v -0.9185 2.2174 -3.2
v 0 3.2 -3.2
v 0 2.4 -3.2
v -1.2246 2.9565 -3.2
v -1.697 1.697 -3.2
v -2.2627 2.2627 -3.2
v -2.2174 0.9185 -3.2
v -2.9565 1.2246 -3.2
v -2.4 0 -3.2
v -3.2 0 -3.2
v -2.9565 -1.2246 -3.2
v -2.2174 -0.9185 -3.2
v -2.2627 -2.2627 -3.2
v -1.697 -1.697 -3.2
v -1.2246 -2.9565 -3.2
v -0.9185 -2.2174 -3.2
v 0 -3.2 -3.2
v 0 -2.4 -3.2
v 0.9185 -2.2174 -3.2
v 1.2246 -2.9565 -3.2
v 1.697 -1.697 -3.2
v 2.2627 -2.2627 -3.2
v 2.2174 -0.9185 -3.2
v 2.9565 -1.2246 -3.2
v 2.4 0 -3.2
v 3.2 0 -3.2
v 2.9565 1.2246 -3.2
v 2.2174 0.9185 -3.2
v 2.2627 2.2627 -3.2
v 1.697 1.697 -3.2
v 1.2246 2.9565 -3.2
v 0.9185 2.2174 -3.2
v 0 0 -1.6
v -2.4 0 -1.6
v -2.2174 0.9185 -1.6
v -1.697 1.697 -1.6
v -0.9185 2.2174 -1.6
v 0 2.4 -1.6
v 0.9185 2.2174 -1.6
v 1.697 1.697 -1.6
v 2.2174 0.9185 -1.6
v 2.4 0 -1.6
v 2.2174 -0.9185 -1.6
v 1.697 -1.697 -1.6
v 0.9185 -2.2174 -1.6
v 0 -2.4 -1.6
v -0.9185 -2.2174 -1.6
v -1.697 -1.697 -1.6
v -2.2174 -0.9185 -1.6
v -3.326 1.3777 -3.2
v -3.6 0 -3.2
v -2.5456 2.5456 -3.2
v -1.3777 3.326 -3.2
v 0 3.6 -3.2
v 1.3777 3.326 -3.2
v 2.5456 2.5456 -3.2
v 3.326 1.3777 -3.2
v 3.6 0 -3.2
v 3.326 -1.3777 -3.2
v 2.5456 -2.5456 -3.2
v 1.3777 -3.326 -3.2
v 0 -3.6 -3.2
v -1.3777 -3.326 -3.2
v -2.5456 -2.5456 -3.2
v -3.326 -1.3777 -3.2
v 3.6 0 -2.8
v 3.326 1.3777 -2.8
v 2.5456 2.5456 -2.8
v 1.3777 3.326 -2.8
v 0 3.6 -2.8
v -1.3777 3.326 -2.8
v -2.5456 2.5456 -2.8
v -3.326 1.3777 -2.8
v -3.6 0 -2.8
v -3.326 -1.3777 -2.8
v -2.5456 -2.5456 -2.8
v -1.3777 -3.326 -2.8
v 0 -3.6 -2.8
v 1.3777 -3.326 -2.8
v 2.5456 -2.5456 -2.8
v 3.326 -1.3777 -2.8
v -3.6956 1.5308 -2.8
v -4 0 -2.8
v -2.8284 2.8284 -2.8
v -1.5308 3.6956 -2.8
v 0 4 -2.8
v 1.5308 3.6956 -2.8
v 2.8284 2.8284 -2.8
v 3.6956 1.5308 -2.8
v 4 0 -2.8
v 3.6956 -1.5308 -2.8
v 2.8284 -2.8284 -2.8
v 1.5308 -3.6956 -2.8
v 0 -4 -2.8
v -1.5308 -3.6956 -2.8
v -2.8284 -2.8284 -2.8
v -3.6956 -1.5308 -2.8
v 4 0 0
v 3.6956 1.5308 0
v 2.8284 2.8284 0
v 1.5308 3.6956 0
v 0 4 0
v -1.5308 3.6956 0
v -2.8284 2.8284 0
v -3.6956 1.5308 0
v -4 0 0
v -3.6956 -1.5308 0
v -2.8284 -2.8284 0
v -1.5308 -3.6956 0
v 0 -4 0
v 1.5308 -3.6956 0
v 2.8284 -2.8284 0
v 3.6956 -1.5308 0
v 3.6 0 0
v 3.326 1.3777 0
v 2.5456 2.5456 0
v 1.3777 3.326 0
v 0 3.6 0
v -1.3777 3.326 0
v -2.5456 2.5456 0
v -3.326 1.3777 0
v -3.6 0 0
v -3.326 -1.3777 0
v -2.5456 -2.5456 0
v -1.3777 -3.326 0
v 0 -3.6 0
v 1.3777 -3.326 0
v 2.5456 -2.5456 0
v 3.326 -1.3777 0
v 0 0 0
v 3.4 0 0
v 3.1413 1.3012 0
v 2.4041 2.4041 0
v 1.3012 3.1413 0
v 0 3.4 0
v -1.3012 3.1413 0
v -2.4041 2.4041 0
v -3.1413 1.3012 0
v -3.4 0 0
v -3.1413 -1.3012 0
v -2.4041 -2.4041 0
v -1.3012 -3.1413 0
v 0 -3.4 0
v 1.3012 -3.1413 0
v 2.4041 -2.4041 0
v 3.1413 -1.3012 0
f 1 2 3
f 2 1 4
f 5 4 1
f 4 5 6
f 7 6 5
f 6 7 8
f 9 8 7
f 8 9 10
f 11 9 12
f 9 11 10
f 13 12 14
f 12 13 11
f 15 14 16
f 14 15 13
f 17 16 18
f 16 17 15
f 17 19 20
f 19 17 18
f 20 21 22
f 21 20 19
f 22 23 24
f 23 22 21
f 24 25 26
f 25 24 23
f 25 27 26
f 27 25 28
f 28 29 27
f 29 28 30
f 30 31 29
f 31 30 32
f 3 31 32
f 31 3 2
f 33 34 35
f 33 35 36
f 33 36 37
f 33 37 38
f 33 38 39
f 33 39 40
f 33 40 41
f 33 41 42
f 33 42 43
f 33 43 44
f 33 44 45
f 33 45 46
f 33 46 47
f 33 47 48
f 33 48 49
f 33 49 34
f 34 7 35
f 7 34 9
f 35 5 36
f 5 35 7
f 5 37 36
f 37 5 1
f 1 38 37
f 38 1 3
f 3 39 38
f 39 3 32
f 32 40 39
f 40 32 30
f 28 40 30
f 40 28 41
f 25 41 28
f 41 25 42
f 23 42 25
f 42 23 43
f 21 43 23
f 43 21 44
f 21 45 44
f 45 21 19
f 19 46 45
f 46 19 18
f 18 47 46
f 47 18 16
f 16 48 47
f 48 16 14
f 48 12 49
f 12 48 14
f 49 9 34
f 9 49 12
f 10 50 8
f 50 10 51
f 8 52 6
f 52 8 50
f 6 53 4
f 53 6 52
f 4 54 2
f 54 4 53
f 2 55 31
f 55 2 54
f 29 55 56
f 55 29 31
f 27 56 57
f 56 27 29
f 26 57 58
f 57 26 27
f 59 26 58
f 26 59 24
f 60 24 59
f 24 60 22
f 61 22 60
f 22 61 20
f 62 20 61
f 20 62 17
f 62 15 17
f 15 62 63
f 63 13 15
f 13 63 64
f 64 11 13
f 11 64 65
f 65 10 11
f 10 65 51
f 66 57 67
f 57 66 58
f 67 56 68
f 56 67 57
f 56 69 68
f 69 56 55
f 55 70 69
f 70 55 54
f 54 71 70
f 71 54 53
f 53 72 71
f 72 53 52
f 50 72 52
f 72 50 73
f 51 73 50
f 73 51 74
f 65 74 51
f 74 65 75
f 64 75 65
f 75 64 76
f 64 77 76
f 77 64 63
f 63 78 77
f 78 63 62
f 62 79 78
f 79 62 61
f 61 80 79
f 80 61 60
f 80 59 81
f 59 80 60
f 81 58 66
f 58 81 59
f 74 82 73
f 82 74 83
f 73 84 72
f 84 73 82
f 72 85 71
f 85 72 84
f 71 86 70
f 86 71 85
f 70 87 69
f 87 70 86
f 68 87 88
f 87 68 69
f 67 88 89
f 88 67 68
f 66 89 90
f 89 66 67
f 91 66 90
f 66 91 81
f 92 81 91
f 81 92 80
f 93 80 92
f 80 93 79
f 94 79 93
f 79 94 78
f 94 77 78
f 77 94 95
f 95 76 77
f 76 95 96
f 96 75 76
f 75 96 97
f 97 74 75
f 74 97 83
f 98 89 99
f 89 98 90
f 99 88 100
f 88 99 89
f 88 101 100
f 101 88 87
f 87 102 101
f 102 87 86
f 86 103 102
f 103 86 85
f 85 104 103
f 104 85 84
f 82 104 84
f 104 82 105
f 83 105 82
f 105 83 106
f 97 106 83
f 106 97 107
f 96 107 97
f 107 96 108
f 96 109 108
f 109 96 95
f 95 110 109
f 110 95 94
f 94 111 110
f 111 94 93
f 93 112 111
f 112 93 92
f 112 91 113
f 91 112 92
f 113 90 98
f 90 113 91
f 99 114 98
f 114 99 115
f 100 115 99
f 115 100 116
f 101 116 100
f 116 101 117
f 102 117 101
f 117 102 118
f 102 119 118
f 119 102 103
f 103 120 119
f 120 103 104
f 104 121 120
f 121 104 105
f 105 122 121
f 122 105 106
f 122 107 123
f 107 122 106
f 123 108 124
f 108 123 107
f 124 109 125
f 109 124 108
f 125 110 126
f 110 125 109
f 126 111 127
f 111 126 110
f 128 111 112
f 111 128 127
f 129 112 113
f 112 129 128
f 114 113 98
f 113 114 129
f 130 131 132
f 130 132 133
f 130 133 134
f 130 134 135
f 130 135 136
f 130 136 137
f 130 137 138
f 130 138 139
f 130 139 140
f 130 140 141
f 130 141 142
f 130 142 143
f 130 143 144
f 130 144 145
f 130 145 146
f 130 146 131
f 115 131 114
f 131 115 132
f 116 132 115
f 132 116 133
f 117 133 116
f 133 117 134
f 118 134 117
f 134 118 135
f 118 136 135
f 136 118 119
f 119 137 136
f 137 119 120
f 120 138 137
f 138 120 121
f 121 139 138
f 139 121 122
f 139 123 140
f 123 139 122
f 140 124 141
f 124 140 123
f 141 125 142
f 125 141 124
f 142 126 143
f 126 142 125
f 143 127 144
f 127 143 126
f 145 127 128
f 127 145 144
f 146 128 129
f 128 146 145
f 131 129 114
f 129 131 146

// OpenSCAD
// file: ../p/4-4ring3.scad
use <../lib.scad>
function ldraw_lib__4_4ring3() = [
// 0 Ring  3 x 1.0
// 0 Name: 4-4ring3.dat
// 0 Author: James Jessiman
// 0 !LDRAW_ORG Primitive UPDATE 2009-01
// 0 !LICENSE Licensed under CC BY 2.0 and CC BY 4.0 : see CAreadme.txt
// 
// 0 BFC CERTIFY CCW
  [0,"BFC","CERTIFY"],
  [0,"BFC","CCW"],
// 
// 0 !HISTORY 1998-12-15 [PTadmin] Official Update 1998-10
// 0 !HISTORY 2002-04-05 [hafhead] Added BFC statement
// 0 !HISTORY 2002-04-25 [PTadmin] Official Update 2002-02
// 0 !HISTORY 2007-06-24 [PTadmin] Header formatted for Contributor Agreement
// 0 !HISTORY 2008-07-01 [PTadmin] Official Update 2008-01
// 0 !HISTORY 2008-08-26 [cwdee] Switch polygon winding and rename
// 0 !HISTORY 2009-05-02 [PTadmin] Official Update 2009-01
// 
// 
// 4 16 -1.5308 0 3.6956 -1.1481 0 2.7717 0 0 3 0 0 4
  [4,16,-1.5308,0,3.6956,-1.1481,0,2.7717,0,0,3,0,0,4],
// 4 16 -2.8284 0 2.8284 -2.1213 0 2.1213 -1.1481 0 2.7717 -1.5308 0 3.6956
  [4,16,-2.8284,0,2.8284,-2.1213,0,2.1213,-1.1481,0,2.7717,-1.5308,0,3.6956],
// 4 16 -3.6956 0 1.5308 -2.7717 0 1.1481 -2.1213 0 2.1213 -2.8284 0 2.8284
  [4,16,-3.6956,0,1.5308,-2.7717,0,1.1481,-2.1213,0,2.1213,-2.8284,0,2.8284],
// 4 16 -4 0 0 -3 0 0 -2.7717 0 1.1481 -3.6956 0 1.5308
  [4,16,-4,0,0,-3,0,0,-2.7717,0,1.1481,-3.6956,0,1.5308],
// 4 16 -3.6956 0 -1.5308 -2.7717 0 -1.1481 -3 0 0 -4 0 0
  [4,16,-3.6956,0,-1.5308,-2.7717,0,-1.1481,-3,0,0,-4,0,0],
// 4 16 -2.8284 0 -2.8284 -2.1213 0 -2.1213 -2.7717 0 -1.1481 -3.6956 0 -1.5308
  [4,16,-2.8284,0,-2.8284,-2.1213,0,-2.1213,-2.7717,0,-1.1481,-3.6956,0,-1.5308],
// 4 16 -1.5308 0 -3.6956 -1.1481 0 -2.7717 -2.1213 0 -2.1213 -2.8284 0 -2.8284
  [4,16,-1.5308,0,-3.6956,-1.1481,0,-2.7717,-2.1213,0,-2.1213,-2.8284,0,-2.8284],
// 4 16 0 0 -4 0 0 -3 -1.1481 0 -2.7717 -1.5308 0 -3.6956
  [4,16,0,0,-4,0,0,-3,-1.1481,0,-2.7717,-1.5308,0,-3.6956],
// 4 16 1.5308 0 -3.6956 1.1481 0 -2.7717 0 0 -3 0 0 -4
  [4,16,1.5308,0,-3.6956,1.1481,0,-2.7717,0,0,-3,0,0,-4],
// 4 16 2.8284 0 -2.8284 2.1213 0 -2.1213 1.1481 0 -2.7717 1.5308 0 -3.6956
  [4,16,2.8284,0,-2.8284,2.1213,0,-2.1213,1.1481,0,-2.7717,1.5308,0,-3.6956],
// 4 16 3.6956 0 -1.5308 2.7717 0 -1.1481 2.1213 0 -2.1213 2.8284 0 -2.8284
  [4,16,3.6956,0,-1.5308,2.7717,0,-1.1481,2.1213,0,-2.1213,2.8284,0,-2.8284],
// 4 16 4 0 0 3 0 0 2.7717 0 -1.1481 3.6956 0 -1.5308
  [4,16,4,0,0,3,0,0,2.7717,0,-1.1481,3.6956,0,-1.5308],
// 4 16 3.6956 0 1.5308 2.7717 0 1.1481 3 0 0 4 0 0
  [4,16,3.6956,0,1.5308,2.7717,0,1.1481,3,0,0,4,0,0],
// 4 16 2.8284 0 2.8284 2.1213 0 2.1213 2.7717 0 1.1481 3.6956 0 1.5308
  [4,16,2.8284,0,2.8284,2.1213,0,2.1213,2.7717,0,1.1481,3.6956,0,1.5308],
// 4 16 1.5308 0 3.6956 1.1481 0 2.7717 2.1213 0 2.1213 2.8284 0 2.8284
  [4,16,1.5308,0,3.6956,1.1481,0,2.7717,2.1213,0,2.1213,2.8284,0,2.8284],
// 4 16 0 0 4 0 0 3 1.1481 0 2.7717 1.5308 0 3.6956
  [4,16,0,0,4,0,0,3,1.1481,0,2.7717,1.5308,0,3.6956],
// 0
];
module ldraw_lib__4_4ring3(step=0, col=false, unit=2/5, alt=false, line=0.2, solid=!$preview)
    makepoly(ldraw_lib__4_4ring3(), step=step, col=col, unit=unit, alt=alt, line=line, solid=solid);
ldraw_lib__4_4ring3(line=0.2);
// file: ../p/4-4cylc.scad
use <../lib.scad>
use <4-4cyli.scad>
use <4-4disc.scad>
use <4-4edge.scad>
function ldraw_lib__4_4cylc() = [
// 0 Cylinder Closed 1.0
// 0 Name: 4-4cylc.dat
// 0 Author: Alex Taylor [anathema]
// 0 !LDRAW_ORG Primitive UPDATE 2009-02
// 0 !LICENSE Licensed under CC BY 2.0 and CC BY 4.0 : see CAreadme.txt
// 
// 0 BFC CERTIFY CCW
  [0,"BFC","CERTIFY"],
  [0,"BFC","CCW"],
// 
// 0 !HISTORY 2008-12-29 [cwdee] Removed one disc
// 0 !HISTORY 2009-09-03 [PTadmin] Official Update 2009-02
// 
// 
// 1 16 0 0 0 1 0 0 0 1 0 0 0 1 4-4edge.dat
  [1,16,0,0,0,1,0,0,0,1,0,0,0,1, ldraw_lib__4_4edge()],
// 1 16 0 1 0 1 0 0 0 1 0 0 0 1 4-4edge.dat
  [1,16,0,1,0,1,0,0,0,1,0,0,0,1, ldraw_lib__4_4edge()],
// 1 16 0 0 0 1 0 0 0 1 0 0 0 1 4-4disc.dat
  [1,16,0,0,0,1,0,0,0,1,0,0,0,1, ldraw_lib__4_4disc()],
// 1 16 0 0 0 1 0 0 0 1 0 0 0 1 4-4cyli.dat
  [1,16,0,0,0,1,0,0,0,1,0,0,0,1, ldraw_lib__4_4cyli()],
// 0
];
module ldraw_lib__4_4cylc(step=0, col=false, unit=2/5, alt=false, line=0.2, solid=!$preview)
    makepoly(ldraw_lib__4_4cylc(), step=step, col=col, unit=unit, alt=alt, line=line, solid=solid);
ldraw_lib__4_4cylc(line=0.2);
// file: ../p/4-4edge.scad
use <../lib.scad>
function ldraw_lib__4_4edge() = [
// 0 Circle 1.0
// 0 Name: 4-4edge.dat
// 0 Author: James Jessiman
// 0 !LDRAW_ORG Primitive UPDATE 2017-01
// 0 !LICENSE Licensed under CC BY 2.0 and CC BY 4.0 : see CAreadme.txt
// 
// 0 BFC CERTIFY CCW
  [0,"BFC","CERTIFY"],
  [0,"BFC","CCW"],
// 
// 0 !HISTORY 1998-12-15 [PTadmin] Official Update 1998-10
// 0 !HISTORY 2005-12-28 [PTadmin] Official Update 2005-01
// 0 !HISTORY 2007-06-24 [PTadmin] Header formatted for Contributor Agreement
// 0 !HISTORY 2008-07-01 [PTadmin] Official Update 2008-01
// 0 !HISTORY 2017-01-15 [Steffen] BFCed
// 0 !HISTORY 2017-12-30 [PTadmin] Official Update 2017-01
// 
// 
// 2 24 1 0 0 0.9239 0 0.3827
  [2,24,1,0,0,0.9239,0,0.3827],
// 2 24 0.9239 0 0.3827 0.7071 0 0.7071
  [2,24,0.9239,0,0.3827,0.7071,0,0.7071],
// 2 24 0.7071 0 0.7071 0.3827 0 0.9239
  [2,24,0.7071,0,0.7071,0.3827,0,0.9239],
// 2 24 0.3827 0 0.9239 0 0 1
  [2,24,0.3827,0,0.9239,0,0,1],
// 2 24 0 0 1 -0.3827 0 0.9239
  [2,24,0,0,1,-0.3827,0,0.9239],
// 2 24 -0.3827 0 0.9239 -0.7071 0 0.7071
  [2,24,-0.3827,0,0.9239,-0.7071,0,0.7071],
// 2 24 -0.7071 0 0.7071 -0.9239 0 0.3827
  [2,24,-0.7071,0,0.7071,-0.9239,0,0.3827],
// 2 24 -0.9239 0 0.3827 -1 0 -0
  [2,24,-0.9239,0,0.3827,-1,0,-0],
// 2 24 -1 0 -0 -0.9239 0 -0.3827
  [2,24,-1,0,-0,-0.9239,0,-0.3827],
// 2 24 -0.9239 0 -0.3827 -0.7071 0 -0.7071
  [2,24,-0.9239,0,-0.3827,-0.7071,0,-0.7071],
// 2 24 -0.7071 0 -0.7071 -0.3827 0 -0.9239
  [2,24,-0.7071,0,-0.7071,-0.3827,0,-0.9239],
// 2 24 -0.3827 0 -0.9239 0 0 -1
  [2,24,-0.3827,0,-0.9239,0,0,-1],
// 2 24 0 0 -1 0.3827 0 -0.9239
  [2,24,0,0,-1,0.3827,0,-0.9239],
// 2 24 0.3827 0 -0.9239 0.7071 0 -0.7071
  [2,24,0.3827,0,-0.9239,0.7071,0,-0.7071],
// 2 24 0.7071 0 -0.7071 0.9239 0 -0.3827
  [2,24,0.7071,0,-0.7071,0.9239,0,-0.3827],
// 2 24 0.9239 0 -0.3827 1 0 0
  [2,24,0.9239,0,-0.3827,1,0,0],
];
module ldraw_lib__4_4edge(step=0, col=false, unit=2/5, alt=false, line=0.2, solid=!$preview)
    makepoly(ldraw_lib__4_4edge(), step=step, col=col, unit=unit, alt=alt, line=line, solid=solid);
ldraw_lib__4_4edge(line=0.2);
// file: ../p/4-4cyli.scad
use <../lib.scad>
function ldraw_lib__4_4cyli() = [
// 0 Cylinder 1.0
// 0 Name: 4-4cyli.dat
// 0 Author: James Jessiman
// 0 !LDRAW_ORG Primitive UPDATE 2005-01
// 0 !LICENSE Licensed under CC BY 2.0 and CC BY 4.0 : see CAreadme.txt
// 
// 0 BFC CERTIFY CCW
  [0,"BFC","CERTIFY"],
  [0,"BFC","CCW"],
// 
// 0 !HISTORY 1998-12-15 [PTadmin] Official Update 1998-10
// 0 !HISTORY 2002-03-23 [sbliss] Added BFC statement; merged headers from files in distributions LDraw 0.27 and Complete.
// 0 !HISTORY 2002-04-25 [PTadmin] Official Update 2002-02
// 0 !HISTORY 2004-12-14 [guyvivan] BFC CCW
// 0 !HISTORY 2005-12-28 [PTadmin] Official Update 2005-01
// 0 !HISTORY 2007-06-24 [PTadmin] Header formatted for Contributor Agreement
// 0 !HISTORY 2008-07-01 [PTadmin] Official Update 2008-01
// 
// 
// 4 16 1 1 0 0.9239 1 0.3827 0.9239 0 0.3827 1 0 0
  [4,16,1,1,0,0.9239,1,0.3827,0.9239,0,0.3827,1,0,0],
// 5 24 1 0 0 1 1 0 0.9239 0 0.3827 0.9239 0 -0.3827
  [5,24,1,0,0,1,1,0,0.9239,0,0.3827,0.9239,0,-0.3827],
// 4 16 0.9239 1 0.3827 0.7071 1 0.7071 0.7071 0 0.7071 0.9239 0 0.3827
  [4,16,0.9239,1,0.3827,0.7071,1,0.7071,0.7071,0,0.7071,0.9239,0,0.3827],
// 5 24 0.9239 0 0.3827 0.9239 1 0.3827 0.7071 0 0.7071 1 0 0
  [5,24,0.9239,0,0.3827,0.9239,1,0.3827,0.7071,0,0.7071,1,0,0],
// 4 16 0.7071 1 0.7071 0.3827 1 0.9239 0.3827 0 0.9239 0.7071 0 0.7071
  [4,16,0.7071,1,0.7071,0.3827,1,0.9239,0.3827,0,0.9239,0.7071,0,0.7071],
// 5 24 0.7071 0 0.7071 0.7071 1 0.7071 0.3827 0 0.9239 0.9239 0 0.3827
  [5,24,0.7071,0,0.7071,0.7071,1,0.7071,0.3827,0,0.9239,0.9239,0,0.3827],
// 4 16 0.3827 1 0.9239 0 1 1 0 0 1 0.3827 0 0.9239
  [4,16,0.3827,1,0.9239,0,1,1,0,0,1,0.3827,0,0.9239],
// 5 24 0.3827 0 0.9239 0.3827 1 0.9239 0 0 1 0.7071 0 0.7071
  [5,24,0.3827,0,0.9239,0.3827,1,0.9239,0,0,1,0.7071,0,0.7071],
// 4 16 0 1 1 -0.3827 1 0.9239 -0.3827 0 0.9239 0 0 1
  [4,16,0,1,1,-0.3827,1,0.9239,-0.3827,0,0.9239,0,0,1],
// 5 24 0 0 1 0 1 1 -0.3827 0 0.9239 0.3827 0 0.9239
  [5,24,0,0,1,0,1,1,-0.3827,0,0.9239,0.3827,0,0.9239],
// 4 16 -0.3827 1 0.9239 -0.7071 1 0.7071 -0.7071 0 0.7071 -0.3827 0 0.9239
  [4,16,-0.3827,1,0.9239,-0.7071,1,0.7071,-0.7071,0,0.7071,-0.3827,0,0.9239],
// 5 24 -0.3827 0 0.9239 -0.3827 1 0.9239 -0.7071 0 0.7071 0 0 1
  [5,24,-0.3827,0,0.9239,-0.3827,1,0.9239,-0.7071,0,0.7071,0,0,1],
// 4 16 -0.7071 1 0.7071 -0.9239 1 0.3827 -0.9239 0 0.3827 -0.7071 0 0.7071
  [4,16,-0.7071,1,0.7071,-0.9239,1,0.3827,-0.9239,0,0.3827,-0.7071,0,0.7071],
// 5 24 -0.7071 0 0.7071 -0.7071 1 0.7071 -0.9239 0 0.3827 -0.3827 0 0.9239
  [5,24,-0.7071,0,0.7071,-0.7071,1,0.7071,-0.9239,0,0.3827,-0.3827,0,0.9239],
// 4 16 -0.9239 1 0.3827 -1 1 0 -1 0 0 -0.9239 0 0.3827
  [4,16,-0.9239,1,0.3827,-1,1,0,-1,0,0,-0.9239,0,0.3827],
// 5 24 -0.9239 0 0.3827 -0.9239 1 0.3827 -1 0 0 -0.7071 0 0.7071
  [5,24,-0.9239,0,0.3827,-0.9239,1,0.3827,-1,0,0,-0.7071,0,0.7071],
// 4 16 -1 1 0 -0.9239 1 -0.3827 -0.9239 0 -0.3827 -1 0 0
  [4,16,-1,1,0,-0.9239,1,-0.3827,-0.9239,0,-0.3827,-1,0,0],
// 5 24 -1 0 0 -1 1 0 -0.9239 0 -0.3827 -0.9239 0 0.3827
  [5,24,-1,0,0,-1,1,0,-0.9239,0,-0.3827,-0.9239,0,0.3827],
// 4 16 -0.9239 1 -0.3827 -0.7071 1 -0.7071 -0.7071 0 -0.7071 -0.9239 0 -0.3827
  [4,16,-0.9239,1,-0.3827,-0.7071,1,-0.7071,-0.7071,0,-0.7071,-0.9239,0,-0.3827],
// 5 24 -0.9239 0 -0.3827 -0.9239 1 -0.3827 -0.7071 0 -0.7071 -1 0 0
  [5,24,-0.9239,0,-0.3827,-0.9239,1,-0.3827,-0.7071,0,-0.7071,-1,0,0],
// 4 16 -0.7071 1 -0.7071 -0.3827 1 -0.9239 -0.3827 0 -0.9239 -0.7071 0 -0.7071
  [4,16,-0.7071,1,-0.7071,-0.3827,1,-0.9239,-0.3827,0,-0.9239,-0.7071,0,-0.7071],
// 5 24 -0.7071 0 -0.7071 -0.7071 1 -0.7071 -0.3827 0 -0.9239 -0.9239 0 -0.3827
  [5,24,-0.7071,0,-0.7071,-0.7071,1,-0.7071,-0.3827,0,-0.9239,-0.9239,0,-0.3827],
// 4 16 -0.3827 1 -0.9239 0 1 -1 0 0 -1 -0.3827 0 -0.9239
  [4,16,-0.3827,1,-0.9239,0,1,-1,0,0,-1,-0.3827,0,-0.9239],
// 5 24 -0.3827 0 -0.9239 -0.3827 1 -0.9239 0 0 -1 -0.7071 0 -0.7071
  [5,24,-0.3827,0,-0.9239,-0.3827,1,-0.9239,0,0,-1,-0.7071,0,-0.7071],
// 4 16 0 1 -1 0.3827 1 -0.9239 0.3827 0 -0.9239 0 0 -1
  [4,16,0,1,-1,0.3827,1,-0.9239,0.3827,0,-0.9239,0,0,-1],
// 5 24 0 0 -1 0 1 -1 0.3827 0 -0.9239 -0.3827 0 -0.9239
  [5,24,0,0,-1,0,1,-1,0.3827,0,-0.9239,-0.3827,0,-0.9239],
// 4 16 0.3827 1 -0.9239 0.7071 1 -0.7071 0.7071 0 -0.7071 0.3827 0 -0.9239
  [4,16,0.3827,1,-0.9239,0.7071,1,-0.7071,0.7071,0,-0.7071,0.3827,0,-0.9239],
// 5 24 0.3827 0 -0.9239 0.3827 1 -0.9239 0.7071 0 -0.7071 0 0 -1
  [5,24,0.3827,0,-0.9239,0.3827,1,-0.9239,0.7071,0,-0.7071,0,0,-1],
// 4 16 0.7071 1 -0.7071 0.9239 1 -0.3827 0.9239 0 -0.3827 0.7071 0 -0.7071
  [4,16,0.7071,1,-0.7071,0.9239,1,-0.3827,0.9239,0,-0.3827,0.7071,0,-0.7071],
// 5 24 0.7071 0 -0.7071 0.7071 1 -0.7071 0.9239 0 -0.3827 0.3827 0 -0.9239
  [5,24,0.7071,0,-0.7071,0.7071,1,-0.7071,0.9239,0,-0.3827,0.3827,0,-0.9239],
// 4 16 0.9239 1 -0.3827 1 1 0 1 0 0 0.9239 0 -0.3827
  [4,16,0.9239,1,-0.3827,1,1,0,1,0,0,0.9239,0,-0.3827],
// 5 24 0.9239 0 -0.3827 0.9239 1 -0.3827 1 0 0 0.7071 0 -0.7071
  [5,24,0.9239,0,-0.3827,0.9239,1,-0.3827,1,0,0,0.7071,0,-0.7071],
// 0
];
module ldraw_lib__4_4cyli(step=0, col=false, unit=2/5, alt=false, line=0.2, solid=!$preview)
    makepoly(ldraw_lib__4_4cyli(), step=step, col=col, unit=unit, alt=alt, line=line, solid=solid);
ldraw_lib__4_4cyli(line=0.2);
// file: ../p/stud4o.scad
use <../lib.scad>
use <4-4cylc.scad>
use <4-4ring3.scad>
function ldraw_lib__stud4o() = [
// 0 Stud Tube Open without Outer Cylinder
// 0 Name: stud4o.dat
// 0 Author: Magnus Forsberg [MagFors]
// 0 !LDRAW_ORG Primitive UPDATE 2011-02
// 0 !LICENSE Licensed under CC BY 2.0 and CC BY 4.0 : see CAreadme.txt
// 
// 0 !HELP This stud is a "antistud" to be used like a underside stud,
// 0 !HELP but without the outer cylinder.
// 0 !HELP 1 47 0 0 0 1 0 0 0 1 0 0 0 1 stud4.dat
// 
// 0 BFC CERTIFY CCW
  [0,"BFC","CERTIFY"],
  [0,"BFC","CCW"],
// 
// 0 !HISTORY 2011-12-29 [PTadmin] Official Update 2011-02
// 
// 
// 1 16 0 -4 0 2 0 0 0 1 0 0 0 2 4-4ring3.dat
  [1,16,0,-4,0,2,0,0,0,1,0,0,0,2, ldraw_lib__4_4ring3()],
// 0 BFC INVERTNEXT
  [0,"BFC","INVERTNEXT"],
// 1 16 0 0 0 -6 0 0 0 -4 0 0 0 6 4-4cylc.dat
  [1,16,0,0,0,-6,0,0,0,-4,0,0,0,6, ldraw_lib__4_4cylc()],
];
module ldraw_lib__stud4o(step=0, col=false, unit=2/5, alt=false, line=0.2, solid=!$preview)
    makepoly(ldraw_lib__stud4o(), step=step, col=col, unit=unit, alt=alt, line=line, solid=solid);
ldraw_lib__stud4o(line=0.2);
// file: ../p/4-4ring8.scad
use <../lib.scad>
function ldraw_lib__4_4ring8() = [
// 0 Ring  8 x 1.0
// 0 Name: 4-4ring8.dat
// 0 Author: Steffen [Steffen]
// 0 !LDRAW_ORG Primitive UPDATE 2012-01
// 0 !LICENSE Licensed under CC BY 2.0 and CC BY 4.0 : see CAreadme.txt
// 
// 0 BFC CERTIFY CCW
  [0,"BFC","CERTIFY"],
  [0,"BFC","CCW"],
// 
// 0 !HISTORY 2003-12-19 [PTadmin] Official Update 2003-03
// 0 !HISTORY 2007-06-24 [PTadmin] Header formatted for Contributor Agreement
// 0 !HISTORY 2008-07-01 [PTadmin] Official Update 2008-01
// 0 !HISTORY 2012-02-16 [Philo] Changed to CCW
// 0 !HISTORY 2012-03-30 [PTadmin] Official Update 2012-01
// 
// 
// 4 16 9 0 0 8.3151 0 3.4443 7.3912 0 3.0616 8 0 0
  [4,16,9,0,0,8.3151,0,3.4443,7.3912,0,3.0616,8,0,0],
// 4 16 8.3151 0 3.4443 6.3639 0 6.3639 5.6568 0 5.6568 7.3912 0 3.0616
  [4,16,8.3151,0,3.4443,6.3639,0,6.3639,5.6568,0,5.6568,7.3912,0,3.0616],
// 4 16 6.3639 0 6.3639 3.4443 0 8.3151 3.0616 0 7.3912 5.6568 0 5.6568
  [4,16,6.3639,0,6.3639,3.4443,0,8.3151,3.0616,0,7.3912,5.6568,0,5.6568],
// 4 16 3.4443 0 8.3151 0 0 9 0 0 8 3.0616 0 7.3912
  [4,16,3.4443,0,8.3151,0,0,9,0,0,8,3.0616,0,7.3912],
// 4 16 0 0 9 -3.4443 0 8.3151 -3.0616 0 7.3912 0 0 8
  [4,16,0,0,9,-3.4443,0,8.3151,-3.0616,0,7.3912,0,0,8],
// 4 16 -3.4443 0 8.3151 -6.3639 0 6.3639 -5.6568 0 5.6568 -3.0616 0 7.3912
  [4,16,-3.4443,0,8.3151,-6.3639,0,6.3639,-5.6568,0,5.6568,-3.0616,0,7.3912],
// 4 16 -6.3639 0 6.3639 -8.3151 0 3.4443 -7.3912 0 3.0616 -5.6568 0 5.6568
  [4,16,-6.3639,0,6.3639,-8.3151,0,3.4443,-7.3912,0,3.0616,-5.6568,0,5.6568],
// 4 16 -8.3151 0 3.4443 -9 0 0 -8 0 0 -7.3912 0 3.0616
  [4,16,-8.3151,0,3.4443,-9,0,0,-8,0,0,-7.3912,0,3.0616],
// 4 16 -9 0 0 -8.3151 0 -3.4443 -7.3912 0 -3.0616 -8 0 0
  [4,16,-9,0,0,-8.3151,0,-3.4443,-7.3912,0,-3.0616,-8,0,0],
// 4 16 -8.3151 0 -3.4443 -6.3639 0 -6.3639 -5.6568 0 -5.6568 -7.3912 0 -3.0616
  [4,16,-8.3151,0,-3.4443,-6.3639,0,-6.3639,-5.6568,0,-5.6568,-7.3912,0,-3.0616],
// 4 16 -6.3639 0 -6.3639 -3.4443 0 -8.3151 -3.0616 0 -7.3912 -5.6568 0 -5.6568
  [4,16,-6.3639,0,-6.3639,-3.4443,0,-8.3151,-3.0616,0,-7.3912,-5.6568,0,-5.6568],
// 4 16 -3.4443 0 -8.3151 0 0 -9 0 0 -8 -3.0616 0 -7.3912
  [4,16,-3.4443,0,-8.3151,0,0,-9,0,0,-8,-3.0616,0,-7.3912],
// 4 16 0 0 -9 3.4443 0 -8.3151 3.0616 0 -7.3912 0 0 -8
  [4,16,0,0,-9,3.4443,0,-8.3151,3.0616,0,-7.3912,0,0,-8],
// 4 16 3.4443 0 -8.3151 6.3639 0 -6.3639 5.6568 0 -5.6568 3.0616 0 -7.3912
  [4,16,3.4443,0,-8.3151,6.3639,0,-6.3639,5.6568,0,-5.6568,3.0616,0,-7.3912],
// 4 16 6.3639 0 -6.3639 8.3151 0 -3.4443 7.3912 0 -3.0616 5.6568 0 -5.6568
  [4,16,6.3639,0,-6.3639,8.3151,0,-3.4443,7.3912,0,-3.0616,5.6568,0,-5.6568],
// 4 16 8.3151 0 -3.4443 9 0 0 8 0 0 7.3912 0 -3.0616
  [4,16,8.3151,0,-3.4443,9,0,0,8,0,0,7.3912,0,-3.0616],
];
module ldraw_lib__4_4ring8(step=0, col=false, unit=2/5, alt=false, line=0.2, solid=!$preview)
    makepoly(ldraw_lib__4_4ring8(), step=step, col=col, unit=unit, alt=alt, line=line, solid=solid);
ldraw_lib__4_4ring8(line=0.2);
// file: ../p/4-4cylo.scad
use <../lib.scad>
use <4-4cyli.scad>
use <4-4edge.scad>
function ldraw_lib__4_4cylo() = [
// 0 Cylinder Open 1.0
// 0 Name: 4-4cylo.dat
// 0 Author: Mark Kennedy [mkennedy]
// 0 !LDRAW_ORG Primitive UPDATE 2010-01
// 0 !LICENSE Licensed under CC BY 2.0 and CC BY 4.0 : see CAreadme.txt
// 
// 0 BFC CERTIFY CCW
  [0,"BFC","CERTIFY"],
  [0,"BFC","CCW"],
// 
// 0 !HISTORY 2010-04-05 [PTadmin] Official Update 2010-01
// 
// 
// 1 16 0 0 0 1 0 0 0 1 0 0 0 1 4-4edge.dat
  [1,16,0,0,0,1,0,0,0,1,0,0,0,1, ldraw_lib__4_4edge()],
// 1 16 0 1 0 1 0 0 0 1 0 0 0 1 4-4edge.dat
  [1,16,0,1,0,1,0,0,0,1,0,0,0,1, ldraw_lib__4_4edge()],
// 1 16 0 0 0 1 0 0 0 1 0 0 0 1 4-4cyli.dat
  [1,16,0,0,0,1,0,0,0,1,0,0,0,1, ldraw_lib__4_4cyli()],
// 0
];
module ldraw_lib__4_4cylo(step=0, col=false, unit=2/5, alt=false, line=0.2, solid=!$preview)
    makepoly(ldraw_lib__4_4cylo(), step=step, col=col, unit=unit, alt=alt, line=line, solid=solid);
ldraw_lib__4_4cylo(line=0.2);
// file: s/98138s02.scad
use <../../lib.scad>
use <../../p/4-4cylo.scad>
use <../../p/4-4ring8.scad>
use <../../p/4-4ring9.scad>
use <../../p/stud4o.scad>
function ldraw_lib__s__98138s02() = [
// 0 ~Tile  1 x  1 Round with Groove without Complete Top Face
// 0 Name: s\98138s02.dat
// 0 Author: Magnus Forsberg [MagFors]
// 0 !LDRAW_ORG Subpart UPDATE 2020-01
// 0 !LICENSE Licensed under CC BY 2.0 and CC BY 4.0 : see CAreadme.txt
// 
// 0 BFC CERTIFY CCW
  [0,"BFC","CERTIFY"],
  [0,"BFC","CCW"],
// 
// 0 !HISTORY 2020-06-28 [PTadmin] Official Update 2020-01
// 
// 
// 1 16 0 4 0 1 0 0 0 -1 0 0 0 1 stud4o.dat
  [1,16,0,4,0,1,0,0,0,-1,0,0,0,1, ldraw_lib__stud4o()],
// 1 16 0 8 0 -1 0 0 0 -1 0 0 0 1 4-4ring8.dat
  [1,16,0,8,0,-1,0,0,0,-1,0,0,0,1, ldraw_lib__4_4ring8()],
// 1 16 0 7 0 9 0 0 0 1 0 0 0 9 4-4cylo.dat
  [1,16,0,7,0,9,0,0,0,1,0,0,0,9, ldraw_lib__4_4cylo()],
// 1 16 0 7 0 -1 0 0 0 -1 0 0 0 1 4-4ring9.dat
  [1,16,0,7,0,-1,0,0,0,-1,0,0,0,1, ldraw_lib__4_4ring9()],
// 1 16 0 0 0 10 0 0 0 7 0 0 0 10 4-4cylo.dat
  [1,16,0,0,0,10,0,0,0,7,0,0,0,10, ldraw_lib__4_4cylo()],
];
module ldraw_lib__s__98138s02(step=0, col=false, unit=2/5, alt=false, line=0.2, solid=!$preview)
    makepoly(ldraw_lib__s__98138s02(), step=step, col=col, unit=unit, alt=alt, line=line, solid=solid);
ldraw_lib__s__98138s02(line=0.2);
// file: ../p/4-4ring9.scad
use <../lib.scad>
function ldraw_lib__4_4ring9() = [
// 0 Ring  9 x 1.0
// 0 Name: 4-4ring9.dat
// 0 Author: John Riley [jriley]
// 0 !LDRAW_ORG Primitive UPDATE 2004-02
// 0 !LICENSE Licensed under CC BY 2.0 and CC BY 4.0 : see CAreadme.txt
// 
// 0 BFC CERTIFY CCW
  [0,"BFC","CERTIFY"],
  [0,"BFC","CCW"],
// 
// 0 !HISTORY 2004-04-22 [PTadmin] Official Update 2004-02
// 0 !HISTORY 2007-06-24 [PTadmin] Header formatted for Contributor Agreement
// 0 !HISTORY 2008-07-01 [PTadmin] Official Update 2008-01
// 
// 
// 4 16 9 0 0 10 0 0 9.239 0 3.827 8.3151 0 3.4443
  [4,16,9,0,0,10,0,0,9.239,0,3.827,8.3151,0,3.4443],
// 4 16 8.3151 0 3.4443 9.239 0 3.827 7.071 0 7.071 6.3639 0 6.3639
  [4,16,8.3151,0,3.4443,9.239,0,3.827,7.071,0,7.071,6.3639,0,6.3639],
// 4 16 6.3639 0 6.3639 7.071 0 7.071 3.827 0 9.239 3.4443 0 8.3151
  [4,16,6.3639,0,6.3639,7.071,0,7.071,3.827,0,9.239,3.4443,0,8.3151],
// 4 16 3.4443 0 8.3151 3.827 0 9.239 0 0 10 0 0 9
  [4,16,3.4443,0,8.3151,3.827,0,9.239,0,0,10,0,0,9],
// 4 16 0 0 9 0 0 10 -3.827 0 9.239 -3.4443 0 8.3151
  [4,16,0,0,9,0,0,10,-3.827,0,9.239,-3.4443,0,8.3151],
// 4 16 -3.4443 0 8.3151 -3.827 0 9.239 -7.071 0 7.071 -6.3639 0 6.3639
  [4,16,-3.4443,0,8.3151,-3.827,0,9.239,-7.071,0,7.071,-6.3639,0,6.3639],
// 4 16 -6.3639 0 6.3639 -7.071 0 7.071 -9.239 0 3.827 -8.3151 0 3.4443
  [4,16,-6.3639,0,6.3639,-7.071,0,7.071,-9.239,0,3.827,-8.3151,0,3.4443],
// 4 16 -8.3151 0 3.4443 -9.239 0 3.827 -10 0 0 -9 0 0
  [4,16,-8.3151,0,3.4443,-9.239,0,3.827,-10,0,0,-9,0,0],
// 4 16 -9 0 0 -10 0 0 -9.239 0 -3.827 -8.3151 0 -3.4443
  [4,16,-9,0,0,-10,0,0,-9.239,0,-3.827,-8.3151,0,-3.4443],
// 4 16 -8.3151 0 -3.4443 -9.239 0 -3.827 -7.071 0 -7.071 -6.3639 0 -6.3639
  [4,16,-8.3151,0,-3.4443,-9.239,0,-3.827,-7.071,0,-7.071,-6.3639,0,-6.3639],
// 4 16 -6.3639 0 -6.3639 -7.071 0 -7.071 -3.827 0 -9.239 -3.4443 0 -8.3151
  [4,16,-6.3639,0,-6.3639,-7.071,0,-7.071,-3.827,0,-9.239,-3.4443,0,-8.3151],
// 4 16 -3.4443 0 -8.3151 -3.827 0 -9.239 0 0 -10 0 0 -9
  [4,16,-3.4443,0,-8.3151,-3.827,0,-9.239,0,0,-10,0,0,-9],
// 4 16 0 0 -9 0 0 -10 3.827 0 -9.239 3.4443 0 -8.3151
  [4,16,0,0,-9,0,0,-10,3.827,0,-9.239,3.4443,0,-8.3151],
// 4 16 3.4443 0 -8.3151 3.827 0 -9.239 7.071 0 -7.071 6.3639 0 -6.3639
  [4,16,3.4443,0,-8.3151,3.827,0,-9.239,7.071,0,-7.071,6.3639,0,-6.3639],
// 4 16 6.3639 0 -6.3639 7.071 0 -7.071 9.239 0 -3.827 8.3151 0 -3.4443
  [4,16,6.3639,0,-6.3639,7.071,0,-7.071,9.239,0,-3.827,8.3151,0,-3.4443],
// 4 16 8.3151 0 -3.4443 9.239 0 -3.827 10 0 0 9 0 0
  [4,16,8.3151,0,-3.4443,9.239,0,-3.827,10,0,0,9,0,0],
// 0
];
module ldraw_lib__4_4ring9(step=0, col=false, unit=2/5, alt=false, line=0.2, solid=!$preview)
    makepoly(ldraw_lib__4_4ring9(), step=step, col=col, unit=unit, alt=alt, line=line, solid=solid);
ldraw_lib__4_4ring9(line=0.2);
// file: s/98138s01.scad
use <../../lib.scad>
use <../../p/4-4ring9.scad>
use <98138s02.scad>
function ldraw_lib__s__98138s01() = [
// 0 ~Tile  1 x  1 Round with Groove with Partial Top Face
// 0 Name: s\98138s01.dat
// 0 Author: Magnus Forsberg [MagFors]
// 0 !LDRAW_ORG Subpart UPDATE 2020-01
// 0 !LICENSE Licensed under CC BY 2.0 and CC BY 4.0 : see CAreadme.txt
// 
// 0 BFC CERTIFY CCW
  [0,"BFC","CERTIFY"],
  [0,"BFC","CCW"],
// 
// 0 !HISTORY 2011-12-29 [PTadmin] Official Update 2011-02
// 0 !HISTORY 2016-06-17 [MagFors] Reduced the rounded edge to 0.5 ldu
// 0 !HISTORY 2016-12-31 [PTadmin] Official Update 2016-01
// 0 !HISTORY 2019-06-17 [MagFors] Removed the rounded edge
// 0 !HISTORY 2019-07-19 [MagFors] Subfiled without top surface
// 0 !HISTORY 2020-06-28 [PTadmin] Official Update 2020-01
// 
// 
// 1 16 0 0 0 1 0 0 0 1 0 0 0 1 s\98138s02.dat
  [1,16,0,0,0,1,0,0,0,1,0,0,0,1, ldraw_lib__s__98138s02()],
// 1 16 0 0 0 1 0 0 0 1 0 0 0 1 4-4ring9.dat
  [1,16,0,0,0,1,0,0,0,1,0,0,0,1, ldraw_lib__4_4ring9()],
];
module ldraw_lib__s__98138s01(step=0, col=false, unit=2/5, alt=false, line=0.2, solid=!$preview)
    makepoly(ldraw_lib__s__98138s01(), step=step, col=col, unit=unit, alt=alt, line=line, solid=solid);
ldraw_lib__s__98138s01(line=0.2);
// file: ../p/4-4rin17.scad
use <../lib.scad>
function ldraw_lib__4_4rin17() = [
// 0 Ring 17 x 1.0
// 0 Name: 4-4rin17.dat
// 0 Author: Miklos Hosszu [hmick]
// 0 !LDRAW_ORG Primitive UPDATE 2012-01
// 0 !LICENSE Licensed under CC BY 2.0 and CC BY 4.0 : see CAreadme.txt
// 
// 0 BFC CERTIFY CCW
  [0,"BFC","CERTIFY"],
  [0,"BFC","CCW"],
// 
// 0 !HISTORY 2004-11-06 [PTadmin] Official Update 2004-04
// 0 !HISTORY 2007-06-24 [PTadmin] Header formatted for Contributor Agreement
// 0 !HISTORY 2008-07-01 [PTadmin] Official Update 2008-01
// 0 !HISTORY 2012-02-16 [Philo] Changed to CCW
// 0 !HISTORY 2012-03-30 [PTadmin] Official Update 2012-01
// 
// 
// 4 16 18 0 0 16.6302 0 6.8886 15.7063 0 6.5059 17 0 0
  [4,16,18,0,0,16.6302,0,6.8886,15.7063,0,6.5059,17,0,0],
// 4 16 16.6302 0 6.8886 12.7278 0 12.7278 12.0207 0 12.0207 15.7063 0 6.5059
  [4,16,16.6302,0,6.8886,12.7278,0,12.7278,12.0207,0,12.0207,15.7063,0,6.5059],
// 4 16 12.7278 0 12.7278 6.8886 0 16.6302 6.5059 0 15.7063 12.0207 0 12.0207
  [4,16,12.7278,0,12.7278,6.8886,0,16.6302,6.5059,0,15.7063,12.0207,0,12.0207],
// 4 16 6.8886 0 16.6302 0 0 18 0 0 17 6.5059 0 15.7063
  [4,16,6.8886,0,16.6302,0,0,18,0,0,17,6.5059,0,15.7063],
// 4 16 0 0 18 -6.8886 0 16.6302 -6.5059 0 15.7063 0 0 17
  [4,16,0,0,18,-6.8886,0,16.6302,-6.5059,0,15.7063,0,0,17],
// 4 16 -6.8886 0 16.6302 -12.7278 0 12.7278 -12.0207 0 12.0207 -6.5059 0 15.7063
  [4,16,-6.8886,0,16.6302,-12.7278,0,12.7278,-12.0207,0,12.0207,-6.5059,0,15.7063],
// 4 16 -12.7278 0 12.7278 -16.6302 0 6.8886 -15.7063 0 6.5059 -12.0207 0 12.0207
  [4,16,-12.7278,0,12.7278,-16.6302,0,6.8886,-15.7063,0,6.5059,-12.0207,0,12.0207],
// 4 16 -16.6302 0 6.8886 -18 0 0 -17 0 0 -15.7063 0 6.5059
  [4,16,-16.6302,0,6.8886,-18,0,0,-17,0,0,-15.7063,0,6.5059],
// 4 16 -18 0 0 -16.6302 0 -6.8886 -15.7063 0 -6.5059 -17 0 0
  [4,16,-18,0,0,-16.6302,0,-6.8886,-15.7063,0,-6.5059,-17,0,0],
// 4 16 -16.6302 0 -6.8886 -12.7278 0 -12.7278 -12.0207 0 -12.0207 -15.7063 0 -6.5059
  [4,16,-16.6302,0,-6.8886,-12.7278,0,-12.7278,-12.0207,0,-12.0207,-15.7063,0,-6.5059],
// 4 16 -12.7278 0 -12.7278 -6.8886 0 -16.6302 -6.5059 0 -15.7063 -12.0207 0 -12.0207
  [4,16,-12.7278,0,-12.7278,-6.8886,0,-16.6302,-6.5059,0,-15.7063,-12.0207,0,-12.0207],
// 4 16 -6.8886 0 -16.6302 0 0 -18 0 0 -17 -6.5059 0 -15.7063
  [4,16,-6.8886,0,-16.6302,0,0,-18,0,0,-17,-6.5059,0,-15.7063],
// 4 16 0 0 -18 6.8886 0 -16.6302 6.5059 0 -15.7063 0 0 -17
  [4,16,0,0,-18,6.8886,0,-16.6302,6.5059,0,-15.7063,0,0,-17],
// 4 16 6.8886 0 -16.6302 12.7278 0 -12.7278 12.0207 0 -12.0207 6.5059 0 -15.7063
  [4,16,6.8886,0,-16.6302,12.7278,0,-12.7278,12.0207,0,-12.0207,6.5059,0,-15.7063],
// 4 16 12.7278 0 -12.7278 16.6302 0 -6.8886 15.7063 0 -6.5059 12.0207 0 -12.0207
  [4,16,12.7278,0,-12.7278,16.6302,0,-6.8886,15.7063,0,-6.5059,12.0207,0,-12.0207],
// 4 16 16.6302 0 -6.8886 18 0 0 17 0 0 15.7063 0 -6.5059
  [4,16,16.6302,0,-6.8886,18,0,0,17,0,0,15.7063,0,-6.5059],
];
module ldraw_lib__4_4rin17(step=0, col=false, unit=2/5, alt=false, line=0.2, solid=!$preview)
    makepoly(ldraw_lib__4_4rin17(), step=step, col=col, unit=unit, alt=alt, line=line, solid=solid);
ldraw_lib__4_4rin17(line=0.2);
// file: ../p/4-4disc.scad
use <../lib.scad>
function ldraw_lib__4_4disc() = [
// 0 Disc 1.0
// 0 Name: 4-4disc.dat
// 0 Author: James Jessiman
// 0 !LDRAW_ORG Primitive UPDATE 2002-02
// 0 !LICENSE Licensed under CC BY 2.0 and CC BY 4.0 : see CAreadme.txt
// 
// 0 BFC CERTIFY CCW
  [0,"BFC","CERTIFY"],
  [0,"BFC","CCW"],
// 
// 0 !HISTORY 1998-12-15 [PTadmin] Official Update 1998-10
// 0 !HISTORY 2002-03-23 [sbliss] Added BFC statement
// 0 !HISTORY 2002-04-25 [PTadmin] Official Update 2002-02
// 0 !HISTORY 2007-06-24 [PTadmin] Header formatted for Contributor Agreement
// 0 !HISTORY 2008-07-01 [PTadmin] Official Update 2008-01
// 
// 
// 3 16 0 0 0 1 0 0 0.9239 0 0.3827
  [3,16,0,0,0,1,0,0,0.9239,0,0.3827],
// 3 16 0 0 0 0.9239 0 0.3827 0.7071 0 0.7071
  [3,16,0,0,0,0.9239,0,0.3827,0.7071,0,0.7071],
// 3 16 0 0 0 0.7071 0 0.7071 0.3827 0 0.9239
  [3,16,0,0,0,0.7071,0,0.7071,0.3827,0,0.9239],
// 3 16 0 0 0 0.3827 0 0.9239 0 0 1
  [3,16,0,0,0,0.3827,0,0.9239,0,0,1],
// 3 16 0 0 0 0 0 1 -0.3827 0 0.9239
  [3,16,0,0,0,0,0,1,-0.3827,0,0.9239],
// 3 16 0 0 0 -0.3827 0 0.9239 -0.7071 0 0.7071
  [3,16,0,0,0,-0.3827,0,0.9239,-0.7071,0,0.7071],
// 3 16 0 0 0 -0.7071 0 0.7071 -0.9239 0 0.3827
  [3,16,0,0,0,-0.7071,0,0.7071,-0.9239,0,0.3827],
// 3 16 0 0 0 -0.9239 0 0.3827 -1 0 -0
  [3,16,0,0,0,-0.9239,0,0.3827,-1,0,-0],
// 3 16 0 0 0 -1 0 -0 -0.9239 0 -0.3827
  [3,16,0,0,0,-1,0,-0,-0.9239,0,-0.3827],
// 3 16 0 0 0 -0.9239 0 -0.3827 -0.7071 0 -0.7071
  [3,16,0,0,0,-0.9239,0,-0.3827,-0.7071,0,-0.7071],
// 3 16 0 0 0 -0.7071 0 -0.7071 -0.3827 0 -0.9239
  [3,16,0,0,0,-0.7071,0,-0.7071,-0.3827,0,-0.9239],
// 3 16 0 0 0 -0.3827 0 -0.9239 0 0 -1
  [3,16,0,0,0,-0.3827,0,-0.9239,0,0,-1],
// 3 16 0 0 0 0 0 -1 0.3827 0 -0.9239
  [3,16,0,0,0,0,0,-1,0.3827,0,-0.9239],
// 3 16 0 0 0 0.3827 0 -0.9239 0.7071 0 -0.7071
  [3,16,0,0,0,0.3827,0,-0.9239,0.7071,0,-0.7071],
// 3 16 0 0 0 0.7071 0 -0.7071 0.9239 0 -0.3827
  [3,16,0,0,0,0.7071,0,-0.7071,0.9239,0,-0.3827],
// 3 16 0 0 0 0.9239 0 -0.3827 1 0 0
  [3,16,0,0,0,0.9239,0,-0.3827,1,0,0],
// 0
];
module ldraw_lib__4_4disc(step=0, col=false, unit=2/5, alt=false, line=0.2, solid=!$preview)
    makepoly(ldraw_lib__4_4disc(), step=step, col=col, unit=unit, alt=alt, line=line, solid=solid);
ldraw_lib__4_4disc(line=0.2);
// main file
use <../lib.scad>
use <../p/4-4disc.scad>
use <../p/4-4rin17.scad>
use <s/98138s01.scad>
function ldraw_lib__98138p0e() = [
// 0 Tile  1 x  1 Round with Silver Dot in Thin Black Circle Pattern
// 0 Name: 98138p0e.dat
// 0 Author: Magnus Forsberg [MagFors]
// 0 !LDRAW_ORG Part UPDATE 2016-01
// 0 !LICENSE Licensed under CC BY 2.0 and CC BY 4.0 : see CAreadme.txt
// 
// 0 BFC CERTIFY CCW
  [0,"BFC","CERTIFY"],
  [0,"BFC","CCW"],
// 
// 0 !KEYWORDS fuel cap, hub cap, jar lid, radiator cap
// 
// 0 !HISTORY 2016-12-31 [PTadmin] Official Update 2016-01
// 
// 
// 1 16 0 0 0 1 0 0 0 1 0 0 0 1 s\98138s01.dat
  [1,16,0,0,0,1,0,0,0,1,0,0,0,1, ldraw_lib__s__98138s01()],
// 1 80 0 0 0 8.5 0 0 0 1 0 0 0 8.5 4-4disc.dat
  [1,80,0,0,0,8.5,0,0,0,1,0,0,0,8.5, ldraw_lib__4_4disc()],
// 1 0 0 0 0 0.5 0 0 0 1 0 0 0 0.5 4-4rin17.dat
  [1,0,0,0,0,0.5,0,0,0,1,0,0,0,0.5, ldraw_lib__4_4rin17()],
];
module ldraw_lib__98138p0e(step=0, col=false, unit=2/5, alt=false, line=0.2, solid=!$preview)
    makepoly(ldraw_lib__98138p0e(), step=step, col=col, unit=unit, alt=alt, line=line, solid=solid);
ldraw_lib__98138p0e(line=0.2);
